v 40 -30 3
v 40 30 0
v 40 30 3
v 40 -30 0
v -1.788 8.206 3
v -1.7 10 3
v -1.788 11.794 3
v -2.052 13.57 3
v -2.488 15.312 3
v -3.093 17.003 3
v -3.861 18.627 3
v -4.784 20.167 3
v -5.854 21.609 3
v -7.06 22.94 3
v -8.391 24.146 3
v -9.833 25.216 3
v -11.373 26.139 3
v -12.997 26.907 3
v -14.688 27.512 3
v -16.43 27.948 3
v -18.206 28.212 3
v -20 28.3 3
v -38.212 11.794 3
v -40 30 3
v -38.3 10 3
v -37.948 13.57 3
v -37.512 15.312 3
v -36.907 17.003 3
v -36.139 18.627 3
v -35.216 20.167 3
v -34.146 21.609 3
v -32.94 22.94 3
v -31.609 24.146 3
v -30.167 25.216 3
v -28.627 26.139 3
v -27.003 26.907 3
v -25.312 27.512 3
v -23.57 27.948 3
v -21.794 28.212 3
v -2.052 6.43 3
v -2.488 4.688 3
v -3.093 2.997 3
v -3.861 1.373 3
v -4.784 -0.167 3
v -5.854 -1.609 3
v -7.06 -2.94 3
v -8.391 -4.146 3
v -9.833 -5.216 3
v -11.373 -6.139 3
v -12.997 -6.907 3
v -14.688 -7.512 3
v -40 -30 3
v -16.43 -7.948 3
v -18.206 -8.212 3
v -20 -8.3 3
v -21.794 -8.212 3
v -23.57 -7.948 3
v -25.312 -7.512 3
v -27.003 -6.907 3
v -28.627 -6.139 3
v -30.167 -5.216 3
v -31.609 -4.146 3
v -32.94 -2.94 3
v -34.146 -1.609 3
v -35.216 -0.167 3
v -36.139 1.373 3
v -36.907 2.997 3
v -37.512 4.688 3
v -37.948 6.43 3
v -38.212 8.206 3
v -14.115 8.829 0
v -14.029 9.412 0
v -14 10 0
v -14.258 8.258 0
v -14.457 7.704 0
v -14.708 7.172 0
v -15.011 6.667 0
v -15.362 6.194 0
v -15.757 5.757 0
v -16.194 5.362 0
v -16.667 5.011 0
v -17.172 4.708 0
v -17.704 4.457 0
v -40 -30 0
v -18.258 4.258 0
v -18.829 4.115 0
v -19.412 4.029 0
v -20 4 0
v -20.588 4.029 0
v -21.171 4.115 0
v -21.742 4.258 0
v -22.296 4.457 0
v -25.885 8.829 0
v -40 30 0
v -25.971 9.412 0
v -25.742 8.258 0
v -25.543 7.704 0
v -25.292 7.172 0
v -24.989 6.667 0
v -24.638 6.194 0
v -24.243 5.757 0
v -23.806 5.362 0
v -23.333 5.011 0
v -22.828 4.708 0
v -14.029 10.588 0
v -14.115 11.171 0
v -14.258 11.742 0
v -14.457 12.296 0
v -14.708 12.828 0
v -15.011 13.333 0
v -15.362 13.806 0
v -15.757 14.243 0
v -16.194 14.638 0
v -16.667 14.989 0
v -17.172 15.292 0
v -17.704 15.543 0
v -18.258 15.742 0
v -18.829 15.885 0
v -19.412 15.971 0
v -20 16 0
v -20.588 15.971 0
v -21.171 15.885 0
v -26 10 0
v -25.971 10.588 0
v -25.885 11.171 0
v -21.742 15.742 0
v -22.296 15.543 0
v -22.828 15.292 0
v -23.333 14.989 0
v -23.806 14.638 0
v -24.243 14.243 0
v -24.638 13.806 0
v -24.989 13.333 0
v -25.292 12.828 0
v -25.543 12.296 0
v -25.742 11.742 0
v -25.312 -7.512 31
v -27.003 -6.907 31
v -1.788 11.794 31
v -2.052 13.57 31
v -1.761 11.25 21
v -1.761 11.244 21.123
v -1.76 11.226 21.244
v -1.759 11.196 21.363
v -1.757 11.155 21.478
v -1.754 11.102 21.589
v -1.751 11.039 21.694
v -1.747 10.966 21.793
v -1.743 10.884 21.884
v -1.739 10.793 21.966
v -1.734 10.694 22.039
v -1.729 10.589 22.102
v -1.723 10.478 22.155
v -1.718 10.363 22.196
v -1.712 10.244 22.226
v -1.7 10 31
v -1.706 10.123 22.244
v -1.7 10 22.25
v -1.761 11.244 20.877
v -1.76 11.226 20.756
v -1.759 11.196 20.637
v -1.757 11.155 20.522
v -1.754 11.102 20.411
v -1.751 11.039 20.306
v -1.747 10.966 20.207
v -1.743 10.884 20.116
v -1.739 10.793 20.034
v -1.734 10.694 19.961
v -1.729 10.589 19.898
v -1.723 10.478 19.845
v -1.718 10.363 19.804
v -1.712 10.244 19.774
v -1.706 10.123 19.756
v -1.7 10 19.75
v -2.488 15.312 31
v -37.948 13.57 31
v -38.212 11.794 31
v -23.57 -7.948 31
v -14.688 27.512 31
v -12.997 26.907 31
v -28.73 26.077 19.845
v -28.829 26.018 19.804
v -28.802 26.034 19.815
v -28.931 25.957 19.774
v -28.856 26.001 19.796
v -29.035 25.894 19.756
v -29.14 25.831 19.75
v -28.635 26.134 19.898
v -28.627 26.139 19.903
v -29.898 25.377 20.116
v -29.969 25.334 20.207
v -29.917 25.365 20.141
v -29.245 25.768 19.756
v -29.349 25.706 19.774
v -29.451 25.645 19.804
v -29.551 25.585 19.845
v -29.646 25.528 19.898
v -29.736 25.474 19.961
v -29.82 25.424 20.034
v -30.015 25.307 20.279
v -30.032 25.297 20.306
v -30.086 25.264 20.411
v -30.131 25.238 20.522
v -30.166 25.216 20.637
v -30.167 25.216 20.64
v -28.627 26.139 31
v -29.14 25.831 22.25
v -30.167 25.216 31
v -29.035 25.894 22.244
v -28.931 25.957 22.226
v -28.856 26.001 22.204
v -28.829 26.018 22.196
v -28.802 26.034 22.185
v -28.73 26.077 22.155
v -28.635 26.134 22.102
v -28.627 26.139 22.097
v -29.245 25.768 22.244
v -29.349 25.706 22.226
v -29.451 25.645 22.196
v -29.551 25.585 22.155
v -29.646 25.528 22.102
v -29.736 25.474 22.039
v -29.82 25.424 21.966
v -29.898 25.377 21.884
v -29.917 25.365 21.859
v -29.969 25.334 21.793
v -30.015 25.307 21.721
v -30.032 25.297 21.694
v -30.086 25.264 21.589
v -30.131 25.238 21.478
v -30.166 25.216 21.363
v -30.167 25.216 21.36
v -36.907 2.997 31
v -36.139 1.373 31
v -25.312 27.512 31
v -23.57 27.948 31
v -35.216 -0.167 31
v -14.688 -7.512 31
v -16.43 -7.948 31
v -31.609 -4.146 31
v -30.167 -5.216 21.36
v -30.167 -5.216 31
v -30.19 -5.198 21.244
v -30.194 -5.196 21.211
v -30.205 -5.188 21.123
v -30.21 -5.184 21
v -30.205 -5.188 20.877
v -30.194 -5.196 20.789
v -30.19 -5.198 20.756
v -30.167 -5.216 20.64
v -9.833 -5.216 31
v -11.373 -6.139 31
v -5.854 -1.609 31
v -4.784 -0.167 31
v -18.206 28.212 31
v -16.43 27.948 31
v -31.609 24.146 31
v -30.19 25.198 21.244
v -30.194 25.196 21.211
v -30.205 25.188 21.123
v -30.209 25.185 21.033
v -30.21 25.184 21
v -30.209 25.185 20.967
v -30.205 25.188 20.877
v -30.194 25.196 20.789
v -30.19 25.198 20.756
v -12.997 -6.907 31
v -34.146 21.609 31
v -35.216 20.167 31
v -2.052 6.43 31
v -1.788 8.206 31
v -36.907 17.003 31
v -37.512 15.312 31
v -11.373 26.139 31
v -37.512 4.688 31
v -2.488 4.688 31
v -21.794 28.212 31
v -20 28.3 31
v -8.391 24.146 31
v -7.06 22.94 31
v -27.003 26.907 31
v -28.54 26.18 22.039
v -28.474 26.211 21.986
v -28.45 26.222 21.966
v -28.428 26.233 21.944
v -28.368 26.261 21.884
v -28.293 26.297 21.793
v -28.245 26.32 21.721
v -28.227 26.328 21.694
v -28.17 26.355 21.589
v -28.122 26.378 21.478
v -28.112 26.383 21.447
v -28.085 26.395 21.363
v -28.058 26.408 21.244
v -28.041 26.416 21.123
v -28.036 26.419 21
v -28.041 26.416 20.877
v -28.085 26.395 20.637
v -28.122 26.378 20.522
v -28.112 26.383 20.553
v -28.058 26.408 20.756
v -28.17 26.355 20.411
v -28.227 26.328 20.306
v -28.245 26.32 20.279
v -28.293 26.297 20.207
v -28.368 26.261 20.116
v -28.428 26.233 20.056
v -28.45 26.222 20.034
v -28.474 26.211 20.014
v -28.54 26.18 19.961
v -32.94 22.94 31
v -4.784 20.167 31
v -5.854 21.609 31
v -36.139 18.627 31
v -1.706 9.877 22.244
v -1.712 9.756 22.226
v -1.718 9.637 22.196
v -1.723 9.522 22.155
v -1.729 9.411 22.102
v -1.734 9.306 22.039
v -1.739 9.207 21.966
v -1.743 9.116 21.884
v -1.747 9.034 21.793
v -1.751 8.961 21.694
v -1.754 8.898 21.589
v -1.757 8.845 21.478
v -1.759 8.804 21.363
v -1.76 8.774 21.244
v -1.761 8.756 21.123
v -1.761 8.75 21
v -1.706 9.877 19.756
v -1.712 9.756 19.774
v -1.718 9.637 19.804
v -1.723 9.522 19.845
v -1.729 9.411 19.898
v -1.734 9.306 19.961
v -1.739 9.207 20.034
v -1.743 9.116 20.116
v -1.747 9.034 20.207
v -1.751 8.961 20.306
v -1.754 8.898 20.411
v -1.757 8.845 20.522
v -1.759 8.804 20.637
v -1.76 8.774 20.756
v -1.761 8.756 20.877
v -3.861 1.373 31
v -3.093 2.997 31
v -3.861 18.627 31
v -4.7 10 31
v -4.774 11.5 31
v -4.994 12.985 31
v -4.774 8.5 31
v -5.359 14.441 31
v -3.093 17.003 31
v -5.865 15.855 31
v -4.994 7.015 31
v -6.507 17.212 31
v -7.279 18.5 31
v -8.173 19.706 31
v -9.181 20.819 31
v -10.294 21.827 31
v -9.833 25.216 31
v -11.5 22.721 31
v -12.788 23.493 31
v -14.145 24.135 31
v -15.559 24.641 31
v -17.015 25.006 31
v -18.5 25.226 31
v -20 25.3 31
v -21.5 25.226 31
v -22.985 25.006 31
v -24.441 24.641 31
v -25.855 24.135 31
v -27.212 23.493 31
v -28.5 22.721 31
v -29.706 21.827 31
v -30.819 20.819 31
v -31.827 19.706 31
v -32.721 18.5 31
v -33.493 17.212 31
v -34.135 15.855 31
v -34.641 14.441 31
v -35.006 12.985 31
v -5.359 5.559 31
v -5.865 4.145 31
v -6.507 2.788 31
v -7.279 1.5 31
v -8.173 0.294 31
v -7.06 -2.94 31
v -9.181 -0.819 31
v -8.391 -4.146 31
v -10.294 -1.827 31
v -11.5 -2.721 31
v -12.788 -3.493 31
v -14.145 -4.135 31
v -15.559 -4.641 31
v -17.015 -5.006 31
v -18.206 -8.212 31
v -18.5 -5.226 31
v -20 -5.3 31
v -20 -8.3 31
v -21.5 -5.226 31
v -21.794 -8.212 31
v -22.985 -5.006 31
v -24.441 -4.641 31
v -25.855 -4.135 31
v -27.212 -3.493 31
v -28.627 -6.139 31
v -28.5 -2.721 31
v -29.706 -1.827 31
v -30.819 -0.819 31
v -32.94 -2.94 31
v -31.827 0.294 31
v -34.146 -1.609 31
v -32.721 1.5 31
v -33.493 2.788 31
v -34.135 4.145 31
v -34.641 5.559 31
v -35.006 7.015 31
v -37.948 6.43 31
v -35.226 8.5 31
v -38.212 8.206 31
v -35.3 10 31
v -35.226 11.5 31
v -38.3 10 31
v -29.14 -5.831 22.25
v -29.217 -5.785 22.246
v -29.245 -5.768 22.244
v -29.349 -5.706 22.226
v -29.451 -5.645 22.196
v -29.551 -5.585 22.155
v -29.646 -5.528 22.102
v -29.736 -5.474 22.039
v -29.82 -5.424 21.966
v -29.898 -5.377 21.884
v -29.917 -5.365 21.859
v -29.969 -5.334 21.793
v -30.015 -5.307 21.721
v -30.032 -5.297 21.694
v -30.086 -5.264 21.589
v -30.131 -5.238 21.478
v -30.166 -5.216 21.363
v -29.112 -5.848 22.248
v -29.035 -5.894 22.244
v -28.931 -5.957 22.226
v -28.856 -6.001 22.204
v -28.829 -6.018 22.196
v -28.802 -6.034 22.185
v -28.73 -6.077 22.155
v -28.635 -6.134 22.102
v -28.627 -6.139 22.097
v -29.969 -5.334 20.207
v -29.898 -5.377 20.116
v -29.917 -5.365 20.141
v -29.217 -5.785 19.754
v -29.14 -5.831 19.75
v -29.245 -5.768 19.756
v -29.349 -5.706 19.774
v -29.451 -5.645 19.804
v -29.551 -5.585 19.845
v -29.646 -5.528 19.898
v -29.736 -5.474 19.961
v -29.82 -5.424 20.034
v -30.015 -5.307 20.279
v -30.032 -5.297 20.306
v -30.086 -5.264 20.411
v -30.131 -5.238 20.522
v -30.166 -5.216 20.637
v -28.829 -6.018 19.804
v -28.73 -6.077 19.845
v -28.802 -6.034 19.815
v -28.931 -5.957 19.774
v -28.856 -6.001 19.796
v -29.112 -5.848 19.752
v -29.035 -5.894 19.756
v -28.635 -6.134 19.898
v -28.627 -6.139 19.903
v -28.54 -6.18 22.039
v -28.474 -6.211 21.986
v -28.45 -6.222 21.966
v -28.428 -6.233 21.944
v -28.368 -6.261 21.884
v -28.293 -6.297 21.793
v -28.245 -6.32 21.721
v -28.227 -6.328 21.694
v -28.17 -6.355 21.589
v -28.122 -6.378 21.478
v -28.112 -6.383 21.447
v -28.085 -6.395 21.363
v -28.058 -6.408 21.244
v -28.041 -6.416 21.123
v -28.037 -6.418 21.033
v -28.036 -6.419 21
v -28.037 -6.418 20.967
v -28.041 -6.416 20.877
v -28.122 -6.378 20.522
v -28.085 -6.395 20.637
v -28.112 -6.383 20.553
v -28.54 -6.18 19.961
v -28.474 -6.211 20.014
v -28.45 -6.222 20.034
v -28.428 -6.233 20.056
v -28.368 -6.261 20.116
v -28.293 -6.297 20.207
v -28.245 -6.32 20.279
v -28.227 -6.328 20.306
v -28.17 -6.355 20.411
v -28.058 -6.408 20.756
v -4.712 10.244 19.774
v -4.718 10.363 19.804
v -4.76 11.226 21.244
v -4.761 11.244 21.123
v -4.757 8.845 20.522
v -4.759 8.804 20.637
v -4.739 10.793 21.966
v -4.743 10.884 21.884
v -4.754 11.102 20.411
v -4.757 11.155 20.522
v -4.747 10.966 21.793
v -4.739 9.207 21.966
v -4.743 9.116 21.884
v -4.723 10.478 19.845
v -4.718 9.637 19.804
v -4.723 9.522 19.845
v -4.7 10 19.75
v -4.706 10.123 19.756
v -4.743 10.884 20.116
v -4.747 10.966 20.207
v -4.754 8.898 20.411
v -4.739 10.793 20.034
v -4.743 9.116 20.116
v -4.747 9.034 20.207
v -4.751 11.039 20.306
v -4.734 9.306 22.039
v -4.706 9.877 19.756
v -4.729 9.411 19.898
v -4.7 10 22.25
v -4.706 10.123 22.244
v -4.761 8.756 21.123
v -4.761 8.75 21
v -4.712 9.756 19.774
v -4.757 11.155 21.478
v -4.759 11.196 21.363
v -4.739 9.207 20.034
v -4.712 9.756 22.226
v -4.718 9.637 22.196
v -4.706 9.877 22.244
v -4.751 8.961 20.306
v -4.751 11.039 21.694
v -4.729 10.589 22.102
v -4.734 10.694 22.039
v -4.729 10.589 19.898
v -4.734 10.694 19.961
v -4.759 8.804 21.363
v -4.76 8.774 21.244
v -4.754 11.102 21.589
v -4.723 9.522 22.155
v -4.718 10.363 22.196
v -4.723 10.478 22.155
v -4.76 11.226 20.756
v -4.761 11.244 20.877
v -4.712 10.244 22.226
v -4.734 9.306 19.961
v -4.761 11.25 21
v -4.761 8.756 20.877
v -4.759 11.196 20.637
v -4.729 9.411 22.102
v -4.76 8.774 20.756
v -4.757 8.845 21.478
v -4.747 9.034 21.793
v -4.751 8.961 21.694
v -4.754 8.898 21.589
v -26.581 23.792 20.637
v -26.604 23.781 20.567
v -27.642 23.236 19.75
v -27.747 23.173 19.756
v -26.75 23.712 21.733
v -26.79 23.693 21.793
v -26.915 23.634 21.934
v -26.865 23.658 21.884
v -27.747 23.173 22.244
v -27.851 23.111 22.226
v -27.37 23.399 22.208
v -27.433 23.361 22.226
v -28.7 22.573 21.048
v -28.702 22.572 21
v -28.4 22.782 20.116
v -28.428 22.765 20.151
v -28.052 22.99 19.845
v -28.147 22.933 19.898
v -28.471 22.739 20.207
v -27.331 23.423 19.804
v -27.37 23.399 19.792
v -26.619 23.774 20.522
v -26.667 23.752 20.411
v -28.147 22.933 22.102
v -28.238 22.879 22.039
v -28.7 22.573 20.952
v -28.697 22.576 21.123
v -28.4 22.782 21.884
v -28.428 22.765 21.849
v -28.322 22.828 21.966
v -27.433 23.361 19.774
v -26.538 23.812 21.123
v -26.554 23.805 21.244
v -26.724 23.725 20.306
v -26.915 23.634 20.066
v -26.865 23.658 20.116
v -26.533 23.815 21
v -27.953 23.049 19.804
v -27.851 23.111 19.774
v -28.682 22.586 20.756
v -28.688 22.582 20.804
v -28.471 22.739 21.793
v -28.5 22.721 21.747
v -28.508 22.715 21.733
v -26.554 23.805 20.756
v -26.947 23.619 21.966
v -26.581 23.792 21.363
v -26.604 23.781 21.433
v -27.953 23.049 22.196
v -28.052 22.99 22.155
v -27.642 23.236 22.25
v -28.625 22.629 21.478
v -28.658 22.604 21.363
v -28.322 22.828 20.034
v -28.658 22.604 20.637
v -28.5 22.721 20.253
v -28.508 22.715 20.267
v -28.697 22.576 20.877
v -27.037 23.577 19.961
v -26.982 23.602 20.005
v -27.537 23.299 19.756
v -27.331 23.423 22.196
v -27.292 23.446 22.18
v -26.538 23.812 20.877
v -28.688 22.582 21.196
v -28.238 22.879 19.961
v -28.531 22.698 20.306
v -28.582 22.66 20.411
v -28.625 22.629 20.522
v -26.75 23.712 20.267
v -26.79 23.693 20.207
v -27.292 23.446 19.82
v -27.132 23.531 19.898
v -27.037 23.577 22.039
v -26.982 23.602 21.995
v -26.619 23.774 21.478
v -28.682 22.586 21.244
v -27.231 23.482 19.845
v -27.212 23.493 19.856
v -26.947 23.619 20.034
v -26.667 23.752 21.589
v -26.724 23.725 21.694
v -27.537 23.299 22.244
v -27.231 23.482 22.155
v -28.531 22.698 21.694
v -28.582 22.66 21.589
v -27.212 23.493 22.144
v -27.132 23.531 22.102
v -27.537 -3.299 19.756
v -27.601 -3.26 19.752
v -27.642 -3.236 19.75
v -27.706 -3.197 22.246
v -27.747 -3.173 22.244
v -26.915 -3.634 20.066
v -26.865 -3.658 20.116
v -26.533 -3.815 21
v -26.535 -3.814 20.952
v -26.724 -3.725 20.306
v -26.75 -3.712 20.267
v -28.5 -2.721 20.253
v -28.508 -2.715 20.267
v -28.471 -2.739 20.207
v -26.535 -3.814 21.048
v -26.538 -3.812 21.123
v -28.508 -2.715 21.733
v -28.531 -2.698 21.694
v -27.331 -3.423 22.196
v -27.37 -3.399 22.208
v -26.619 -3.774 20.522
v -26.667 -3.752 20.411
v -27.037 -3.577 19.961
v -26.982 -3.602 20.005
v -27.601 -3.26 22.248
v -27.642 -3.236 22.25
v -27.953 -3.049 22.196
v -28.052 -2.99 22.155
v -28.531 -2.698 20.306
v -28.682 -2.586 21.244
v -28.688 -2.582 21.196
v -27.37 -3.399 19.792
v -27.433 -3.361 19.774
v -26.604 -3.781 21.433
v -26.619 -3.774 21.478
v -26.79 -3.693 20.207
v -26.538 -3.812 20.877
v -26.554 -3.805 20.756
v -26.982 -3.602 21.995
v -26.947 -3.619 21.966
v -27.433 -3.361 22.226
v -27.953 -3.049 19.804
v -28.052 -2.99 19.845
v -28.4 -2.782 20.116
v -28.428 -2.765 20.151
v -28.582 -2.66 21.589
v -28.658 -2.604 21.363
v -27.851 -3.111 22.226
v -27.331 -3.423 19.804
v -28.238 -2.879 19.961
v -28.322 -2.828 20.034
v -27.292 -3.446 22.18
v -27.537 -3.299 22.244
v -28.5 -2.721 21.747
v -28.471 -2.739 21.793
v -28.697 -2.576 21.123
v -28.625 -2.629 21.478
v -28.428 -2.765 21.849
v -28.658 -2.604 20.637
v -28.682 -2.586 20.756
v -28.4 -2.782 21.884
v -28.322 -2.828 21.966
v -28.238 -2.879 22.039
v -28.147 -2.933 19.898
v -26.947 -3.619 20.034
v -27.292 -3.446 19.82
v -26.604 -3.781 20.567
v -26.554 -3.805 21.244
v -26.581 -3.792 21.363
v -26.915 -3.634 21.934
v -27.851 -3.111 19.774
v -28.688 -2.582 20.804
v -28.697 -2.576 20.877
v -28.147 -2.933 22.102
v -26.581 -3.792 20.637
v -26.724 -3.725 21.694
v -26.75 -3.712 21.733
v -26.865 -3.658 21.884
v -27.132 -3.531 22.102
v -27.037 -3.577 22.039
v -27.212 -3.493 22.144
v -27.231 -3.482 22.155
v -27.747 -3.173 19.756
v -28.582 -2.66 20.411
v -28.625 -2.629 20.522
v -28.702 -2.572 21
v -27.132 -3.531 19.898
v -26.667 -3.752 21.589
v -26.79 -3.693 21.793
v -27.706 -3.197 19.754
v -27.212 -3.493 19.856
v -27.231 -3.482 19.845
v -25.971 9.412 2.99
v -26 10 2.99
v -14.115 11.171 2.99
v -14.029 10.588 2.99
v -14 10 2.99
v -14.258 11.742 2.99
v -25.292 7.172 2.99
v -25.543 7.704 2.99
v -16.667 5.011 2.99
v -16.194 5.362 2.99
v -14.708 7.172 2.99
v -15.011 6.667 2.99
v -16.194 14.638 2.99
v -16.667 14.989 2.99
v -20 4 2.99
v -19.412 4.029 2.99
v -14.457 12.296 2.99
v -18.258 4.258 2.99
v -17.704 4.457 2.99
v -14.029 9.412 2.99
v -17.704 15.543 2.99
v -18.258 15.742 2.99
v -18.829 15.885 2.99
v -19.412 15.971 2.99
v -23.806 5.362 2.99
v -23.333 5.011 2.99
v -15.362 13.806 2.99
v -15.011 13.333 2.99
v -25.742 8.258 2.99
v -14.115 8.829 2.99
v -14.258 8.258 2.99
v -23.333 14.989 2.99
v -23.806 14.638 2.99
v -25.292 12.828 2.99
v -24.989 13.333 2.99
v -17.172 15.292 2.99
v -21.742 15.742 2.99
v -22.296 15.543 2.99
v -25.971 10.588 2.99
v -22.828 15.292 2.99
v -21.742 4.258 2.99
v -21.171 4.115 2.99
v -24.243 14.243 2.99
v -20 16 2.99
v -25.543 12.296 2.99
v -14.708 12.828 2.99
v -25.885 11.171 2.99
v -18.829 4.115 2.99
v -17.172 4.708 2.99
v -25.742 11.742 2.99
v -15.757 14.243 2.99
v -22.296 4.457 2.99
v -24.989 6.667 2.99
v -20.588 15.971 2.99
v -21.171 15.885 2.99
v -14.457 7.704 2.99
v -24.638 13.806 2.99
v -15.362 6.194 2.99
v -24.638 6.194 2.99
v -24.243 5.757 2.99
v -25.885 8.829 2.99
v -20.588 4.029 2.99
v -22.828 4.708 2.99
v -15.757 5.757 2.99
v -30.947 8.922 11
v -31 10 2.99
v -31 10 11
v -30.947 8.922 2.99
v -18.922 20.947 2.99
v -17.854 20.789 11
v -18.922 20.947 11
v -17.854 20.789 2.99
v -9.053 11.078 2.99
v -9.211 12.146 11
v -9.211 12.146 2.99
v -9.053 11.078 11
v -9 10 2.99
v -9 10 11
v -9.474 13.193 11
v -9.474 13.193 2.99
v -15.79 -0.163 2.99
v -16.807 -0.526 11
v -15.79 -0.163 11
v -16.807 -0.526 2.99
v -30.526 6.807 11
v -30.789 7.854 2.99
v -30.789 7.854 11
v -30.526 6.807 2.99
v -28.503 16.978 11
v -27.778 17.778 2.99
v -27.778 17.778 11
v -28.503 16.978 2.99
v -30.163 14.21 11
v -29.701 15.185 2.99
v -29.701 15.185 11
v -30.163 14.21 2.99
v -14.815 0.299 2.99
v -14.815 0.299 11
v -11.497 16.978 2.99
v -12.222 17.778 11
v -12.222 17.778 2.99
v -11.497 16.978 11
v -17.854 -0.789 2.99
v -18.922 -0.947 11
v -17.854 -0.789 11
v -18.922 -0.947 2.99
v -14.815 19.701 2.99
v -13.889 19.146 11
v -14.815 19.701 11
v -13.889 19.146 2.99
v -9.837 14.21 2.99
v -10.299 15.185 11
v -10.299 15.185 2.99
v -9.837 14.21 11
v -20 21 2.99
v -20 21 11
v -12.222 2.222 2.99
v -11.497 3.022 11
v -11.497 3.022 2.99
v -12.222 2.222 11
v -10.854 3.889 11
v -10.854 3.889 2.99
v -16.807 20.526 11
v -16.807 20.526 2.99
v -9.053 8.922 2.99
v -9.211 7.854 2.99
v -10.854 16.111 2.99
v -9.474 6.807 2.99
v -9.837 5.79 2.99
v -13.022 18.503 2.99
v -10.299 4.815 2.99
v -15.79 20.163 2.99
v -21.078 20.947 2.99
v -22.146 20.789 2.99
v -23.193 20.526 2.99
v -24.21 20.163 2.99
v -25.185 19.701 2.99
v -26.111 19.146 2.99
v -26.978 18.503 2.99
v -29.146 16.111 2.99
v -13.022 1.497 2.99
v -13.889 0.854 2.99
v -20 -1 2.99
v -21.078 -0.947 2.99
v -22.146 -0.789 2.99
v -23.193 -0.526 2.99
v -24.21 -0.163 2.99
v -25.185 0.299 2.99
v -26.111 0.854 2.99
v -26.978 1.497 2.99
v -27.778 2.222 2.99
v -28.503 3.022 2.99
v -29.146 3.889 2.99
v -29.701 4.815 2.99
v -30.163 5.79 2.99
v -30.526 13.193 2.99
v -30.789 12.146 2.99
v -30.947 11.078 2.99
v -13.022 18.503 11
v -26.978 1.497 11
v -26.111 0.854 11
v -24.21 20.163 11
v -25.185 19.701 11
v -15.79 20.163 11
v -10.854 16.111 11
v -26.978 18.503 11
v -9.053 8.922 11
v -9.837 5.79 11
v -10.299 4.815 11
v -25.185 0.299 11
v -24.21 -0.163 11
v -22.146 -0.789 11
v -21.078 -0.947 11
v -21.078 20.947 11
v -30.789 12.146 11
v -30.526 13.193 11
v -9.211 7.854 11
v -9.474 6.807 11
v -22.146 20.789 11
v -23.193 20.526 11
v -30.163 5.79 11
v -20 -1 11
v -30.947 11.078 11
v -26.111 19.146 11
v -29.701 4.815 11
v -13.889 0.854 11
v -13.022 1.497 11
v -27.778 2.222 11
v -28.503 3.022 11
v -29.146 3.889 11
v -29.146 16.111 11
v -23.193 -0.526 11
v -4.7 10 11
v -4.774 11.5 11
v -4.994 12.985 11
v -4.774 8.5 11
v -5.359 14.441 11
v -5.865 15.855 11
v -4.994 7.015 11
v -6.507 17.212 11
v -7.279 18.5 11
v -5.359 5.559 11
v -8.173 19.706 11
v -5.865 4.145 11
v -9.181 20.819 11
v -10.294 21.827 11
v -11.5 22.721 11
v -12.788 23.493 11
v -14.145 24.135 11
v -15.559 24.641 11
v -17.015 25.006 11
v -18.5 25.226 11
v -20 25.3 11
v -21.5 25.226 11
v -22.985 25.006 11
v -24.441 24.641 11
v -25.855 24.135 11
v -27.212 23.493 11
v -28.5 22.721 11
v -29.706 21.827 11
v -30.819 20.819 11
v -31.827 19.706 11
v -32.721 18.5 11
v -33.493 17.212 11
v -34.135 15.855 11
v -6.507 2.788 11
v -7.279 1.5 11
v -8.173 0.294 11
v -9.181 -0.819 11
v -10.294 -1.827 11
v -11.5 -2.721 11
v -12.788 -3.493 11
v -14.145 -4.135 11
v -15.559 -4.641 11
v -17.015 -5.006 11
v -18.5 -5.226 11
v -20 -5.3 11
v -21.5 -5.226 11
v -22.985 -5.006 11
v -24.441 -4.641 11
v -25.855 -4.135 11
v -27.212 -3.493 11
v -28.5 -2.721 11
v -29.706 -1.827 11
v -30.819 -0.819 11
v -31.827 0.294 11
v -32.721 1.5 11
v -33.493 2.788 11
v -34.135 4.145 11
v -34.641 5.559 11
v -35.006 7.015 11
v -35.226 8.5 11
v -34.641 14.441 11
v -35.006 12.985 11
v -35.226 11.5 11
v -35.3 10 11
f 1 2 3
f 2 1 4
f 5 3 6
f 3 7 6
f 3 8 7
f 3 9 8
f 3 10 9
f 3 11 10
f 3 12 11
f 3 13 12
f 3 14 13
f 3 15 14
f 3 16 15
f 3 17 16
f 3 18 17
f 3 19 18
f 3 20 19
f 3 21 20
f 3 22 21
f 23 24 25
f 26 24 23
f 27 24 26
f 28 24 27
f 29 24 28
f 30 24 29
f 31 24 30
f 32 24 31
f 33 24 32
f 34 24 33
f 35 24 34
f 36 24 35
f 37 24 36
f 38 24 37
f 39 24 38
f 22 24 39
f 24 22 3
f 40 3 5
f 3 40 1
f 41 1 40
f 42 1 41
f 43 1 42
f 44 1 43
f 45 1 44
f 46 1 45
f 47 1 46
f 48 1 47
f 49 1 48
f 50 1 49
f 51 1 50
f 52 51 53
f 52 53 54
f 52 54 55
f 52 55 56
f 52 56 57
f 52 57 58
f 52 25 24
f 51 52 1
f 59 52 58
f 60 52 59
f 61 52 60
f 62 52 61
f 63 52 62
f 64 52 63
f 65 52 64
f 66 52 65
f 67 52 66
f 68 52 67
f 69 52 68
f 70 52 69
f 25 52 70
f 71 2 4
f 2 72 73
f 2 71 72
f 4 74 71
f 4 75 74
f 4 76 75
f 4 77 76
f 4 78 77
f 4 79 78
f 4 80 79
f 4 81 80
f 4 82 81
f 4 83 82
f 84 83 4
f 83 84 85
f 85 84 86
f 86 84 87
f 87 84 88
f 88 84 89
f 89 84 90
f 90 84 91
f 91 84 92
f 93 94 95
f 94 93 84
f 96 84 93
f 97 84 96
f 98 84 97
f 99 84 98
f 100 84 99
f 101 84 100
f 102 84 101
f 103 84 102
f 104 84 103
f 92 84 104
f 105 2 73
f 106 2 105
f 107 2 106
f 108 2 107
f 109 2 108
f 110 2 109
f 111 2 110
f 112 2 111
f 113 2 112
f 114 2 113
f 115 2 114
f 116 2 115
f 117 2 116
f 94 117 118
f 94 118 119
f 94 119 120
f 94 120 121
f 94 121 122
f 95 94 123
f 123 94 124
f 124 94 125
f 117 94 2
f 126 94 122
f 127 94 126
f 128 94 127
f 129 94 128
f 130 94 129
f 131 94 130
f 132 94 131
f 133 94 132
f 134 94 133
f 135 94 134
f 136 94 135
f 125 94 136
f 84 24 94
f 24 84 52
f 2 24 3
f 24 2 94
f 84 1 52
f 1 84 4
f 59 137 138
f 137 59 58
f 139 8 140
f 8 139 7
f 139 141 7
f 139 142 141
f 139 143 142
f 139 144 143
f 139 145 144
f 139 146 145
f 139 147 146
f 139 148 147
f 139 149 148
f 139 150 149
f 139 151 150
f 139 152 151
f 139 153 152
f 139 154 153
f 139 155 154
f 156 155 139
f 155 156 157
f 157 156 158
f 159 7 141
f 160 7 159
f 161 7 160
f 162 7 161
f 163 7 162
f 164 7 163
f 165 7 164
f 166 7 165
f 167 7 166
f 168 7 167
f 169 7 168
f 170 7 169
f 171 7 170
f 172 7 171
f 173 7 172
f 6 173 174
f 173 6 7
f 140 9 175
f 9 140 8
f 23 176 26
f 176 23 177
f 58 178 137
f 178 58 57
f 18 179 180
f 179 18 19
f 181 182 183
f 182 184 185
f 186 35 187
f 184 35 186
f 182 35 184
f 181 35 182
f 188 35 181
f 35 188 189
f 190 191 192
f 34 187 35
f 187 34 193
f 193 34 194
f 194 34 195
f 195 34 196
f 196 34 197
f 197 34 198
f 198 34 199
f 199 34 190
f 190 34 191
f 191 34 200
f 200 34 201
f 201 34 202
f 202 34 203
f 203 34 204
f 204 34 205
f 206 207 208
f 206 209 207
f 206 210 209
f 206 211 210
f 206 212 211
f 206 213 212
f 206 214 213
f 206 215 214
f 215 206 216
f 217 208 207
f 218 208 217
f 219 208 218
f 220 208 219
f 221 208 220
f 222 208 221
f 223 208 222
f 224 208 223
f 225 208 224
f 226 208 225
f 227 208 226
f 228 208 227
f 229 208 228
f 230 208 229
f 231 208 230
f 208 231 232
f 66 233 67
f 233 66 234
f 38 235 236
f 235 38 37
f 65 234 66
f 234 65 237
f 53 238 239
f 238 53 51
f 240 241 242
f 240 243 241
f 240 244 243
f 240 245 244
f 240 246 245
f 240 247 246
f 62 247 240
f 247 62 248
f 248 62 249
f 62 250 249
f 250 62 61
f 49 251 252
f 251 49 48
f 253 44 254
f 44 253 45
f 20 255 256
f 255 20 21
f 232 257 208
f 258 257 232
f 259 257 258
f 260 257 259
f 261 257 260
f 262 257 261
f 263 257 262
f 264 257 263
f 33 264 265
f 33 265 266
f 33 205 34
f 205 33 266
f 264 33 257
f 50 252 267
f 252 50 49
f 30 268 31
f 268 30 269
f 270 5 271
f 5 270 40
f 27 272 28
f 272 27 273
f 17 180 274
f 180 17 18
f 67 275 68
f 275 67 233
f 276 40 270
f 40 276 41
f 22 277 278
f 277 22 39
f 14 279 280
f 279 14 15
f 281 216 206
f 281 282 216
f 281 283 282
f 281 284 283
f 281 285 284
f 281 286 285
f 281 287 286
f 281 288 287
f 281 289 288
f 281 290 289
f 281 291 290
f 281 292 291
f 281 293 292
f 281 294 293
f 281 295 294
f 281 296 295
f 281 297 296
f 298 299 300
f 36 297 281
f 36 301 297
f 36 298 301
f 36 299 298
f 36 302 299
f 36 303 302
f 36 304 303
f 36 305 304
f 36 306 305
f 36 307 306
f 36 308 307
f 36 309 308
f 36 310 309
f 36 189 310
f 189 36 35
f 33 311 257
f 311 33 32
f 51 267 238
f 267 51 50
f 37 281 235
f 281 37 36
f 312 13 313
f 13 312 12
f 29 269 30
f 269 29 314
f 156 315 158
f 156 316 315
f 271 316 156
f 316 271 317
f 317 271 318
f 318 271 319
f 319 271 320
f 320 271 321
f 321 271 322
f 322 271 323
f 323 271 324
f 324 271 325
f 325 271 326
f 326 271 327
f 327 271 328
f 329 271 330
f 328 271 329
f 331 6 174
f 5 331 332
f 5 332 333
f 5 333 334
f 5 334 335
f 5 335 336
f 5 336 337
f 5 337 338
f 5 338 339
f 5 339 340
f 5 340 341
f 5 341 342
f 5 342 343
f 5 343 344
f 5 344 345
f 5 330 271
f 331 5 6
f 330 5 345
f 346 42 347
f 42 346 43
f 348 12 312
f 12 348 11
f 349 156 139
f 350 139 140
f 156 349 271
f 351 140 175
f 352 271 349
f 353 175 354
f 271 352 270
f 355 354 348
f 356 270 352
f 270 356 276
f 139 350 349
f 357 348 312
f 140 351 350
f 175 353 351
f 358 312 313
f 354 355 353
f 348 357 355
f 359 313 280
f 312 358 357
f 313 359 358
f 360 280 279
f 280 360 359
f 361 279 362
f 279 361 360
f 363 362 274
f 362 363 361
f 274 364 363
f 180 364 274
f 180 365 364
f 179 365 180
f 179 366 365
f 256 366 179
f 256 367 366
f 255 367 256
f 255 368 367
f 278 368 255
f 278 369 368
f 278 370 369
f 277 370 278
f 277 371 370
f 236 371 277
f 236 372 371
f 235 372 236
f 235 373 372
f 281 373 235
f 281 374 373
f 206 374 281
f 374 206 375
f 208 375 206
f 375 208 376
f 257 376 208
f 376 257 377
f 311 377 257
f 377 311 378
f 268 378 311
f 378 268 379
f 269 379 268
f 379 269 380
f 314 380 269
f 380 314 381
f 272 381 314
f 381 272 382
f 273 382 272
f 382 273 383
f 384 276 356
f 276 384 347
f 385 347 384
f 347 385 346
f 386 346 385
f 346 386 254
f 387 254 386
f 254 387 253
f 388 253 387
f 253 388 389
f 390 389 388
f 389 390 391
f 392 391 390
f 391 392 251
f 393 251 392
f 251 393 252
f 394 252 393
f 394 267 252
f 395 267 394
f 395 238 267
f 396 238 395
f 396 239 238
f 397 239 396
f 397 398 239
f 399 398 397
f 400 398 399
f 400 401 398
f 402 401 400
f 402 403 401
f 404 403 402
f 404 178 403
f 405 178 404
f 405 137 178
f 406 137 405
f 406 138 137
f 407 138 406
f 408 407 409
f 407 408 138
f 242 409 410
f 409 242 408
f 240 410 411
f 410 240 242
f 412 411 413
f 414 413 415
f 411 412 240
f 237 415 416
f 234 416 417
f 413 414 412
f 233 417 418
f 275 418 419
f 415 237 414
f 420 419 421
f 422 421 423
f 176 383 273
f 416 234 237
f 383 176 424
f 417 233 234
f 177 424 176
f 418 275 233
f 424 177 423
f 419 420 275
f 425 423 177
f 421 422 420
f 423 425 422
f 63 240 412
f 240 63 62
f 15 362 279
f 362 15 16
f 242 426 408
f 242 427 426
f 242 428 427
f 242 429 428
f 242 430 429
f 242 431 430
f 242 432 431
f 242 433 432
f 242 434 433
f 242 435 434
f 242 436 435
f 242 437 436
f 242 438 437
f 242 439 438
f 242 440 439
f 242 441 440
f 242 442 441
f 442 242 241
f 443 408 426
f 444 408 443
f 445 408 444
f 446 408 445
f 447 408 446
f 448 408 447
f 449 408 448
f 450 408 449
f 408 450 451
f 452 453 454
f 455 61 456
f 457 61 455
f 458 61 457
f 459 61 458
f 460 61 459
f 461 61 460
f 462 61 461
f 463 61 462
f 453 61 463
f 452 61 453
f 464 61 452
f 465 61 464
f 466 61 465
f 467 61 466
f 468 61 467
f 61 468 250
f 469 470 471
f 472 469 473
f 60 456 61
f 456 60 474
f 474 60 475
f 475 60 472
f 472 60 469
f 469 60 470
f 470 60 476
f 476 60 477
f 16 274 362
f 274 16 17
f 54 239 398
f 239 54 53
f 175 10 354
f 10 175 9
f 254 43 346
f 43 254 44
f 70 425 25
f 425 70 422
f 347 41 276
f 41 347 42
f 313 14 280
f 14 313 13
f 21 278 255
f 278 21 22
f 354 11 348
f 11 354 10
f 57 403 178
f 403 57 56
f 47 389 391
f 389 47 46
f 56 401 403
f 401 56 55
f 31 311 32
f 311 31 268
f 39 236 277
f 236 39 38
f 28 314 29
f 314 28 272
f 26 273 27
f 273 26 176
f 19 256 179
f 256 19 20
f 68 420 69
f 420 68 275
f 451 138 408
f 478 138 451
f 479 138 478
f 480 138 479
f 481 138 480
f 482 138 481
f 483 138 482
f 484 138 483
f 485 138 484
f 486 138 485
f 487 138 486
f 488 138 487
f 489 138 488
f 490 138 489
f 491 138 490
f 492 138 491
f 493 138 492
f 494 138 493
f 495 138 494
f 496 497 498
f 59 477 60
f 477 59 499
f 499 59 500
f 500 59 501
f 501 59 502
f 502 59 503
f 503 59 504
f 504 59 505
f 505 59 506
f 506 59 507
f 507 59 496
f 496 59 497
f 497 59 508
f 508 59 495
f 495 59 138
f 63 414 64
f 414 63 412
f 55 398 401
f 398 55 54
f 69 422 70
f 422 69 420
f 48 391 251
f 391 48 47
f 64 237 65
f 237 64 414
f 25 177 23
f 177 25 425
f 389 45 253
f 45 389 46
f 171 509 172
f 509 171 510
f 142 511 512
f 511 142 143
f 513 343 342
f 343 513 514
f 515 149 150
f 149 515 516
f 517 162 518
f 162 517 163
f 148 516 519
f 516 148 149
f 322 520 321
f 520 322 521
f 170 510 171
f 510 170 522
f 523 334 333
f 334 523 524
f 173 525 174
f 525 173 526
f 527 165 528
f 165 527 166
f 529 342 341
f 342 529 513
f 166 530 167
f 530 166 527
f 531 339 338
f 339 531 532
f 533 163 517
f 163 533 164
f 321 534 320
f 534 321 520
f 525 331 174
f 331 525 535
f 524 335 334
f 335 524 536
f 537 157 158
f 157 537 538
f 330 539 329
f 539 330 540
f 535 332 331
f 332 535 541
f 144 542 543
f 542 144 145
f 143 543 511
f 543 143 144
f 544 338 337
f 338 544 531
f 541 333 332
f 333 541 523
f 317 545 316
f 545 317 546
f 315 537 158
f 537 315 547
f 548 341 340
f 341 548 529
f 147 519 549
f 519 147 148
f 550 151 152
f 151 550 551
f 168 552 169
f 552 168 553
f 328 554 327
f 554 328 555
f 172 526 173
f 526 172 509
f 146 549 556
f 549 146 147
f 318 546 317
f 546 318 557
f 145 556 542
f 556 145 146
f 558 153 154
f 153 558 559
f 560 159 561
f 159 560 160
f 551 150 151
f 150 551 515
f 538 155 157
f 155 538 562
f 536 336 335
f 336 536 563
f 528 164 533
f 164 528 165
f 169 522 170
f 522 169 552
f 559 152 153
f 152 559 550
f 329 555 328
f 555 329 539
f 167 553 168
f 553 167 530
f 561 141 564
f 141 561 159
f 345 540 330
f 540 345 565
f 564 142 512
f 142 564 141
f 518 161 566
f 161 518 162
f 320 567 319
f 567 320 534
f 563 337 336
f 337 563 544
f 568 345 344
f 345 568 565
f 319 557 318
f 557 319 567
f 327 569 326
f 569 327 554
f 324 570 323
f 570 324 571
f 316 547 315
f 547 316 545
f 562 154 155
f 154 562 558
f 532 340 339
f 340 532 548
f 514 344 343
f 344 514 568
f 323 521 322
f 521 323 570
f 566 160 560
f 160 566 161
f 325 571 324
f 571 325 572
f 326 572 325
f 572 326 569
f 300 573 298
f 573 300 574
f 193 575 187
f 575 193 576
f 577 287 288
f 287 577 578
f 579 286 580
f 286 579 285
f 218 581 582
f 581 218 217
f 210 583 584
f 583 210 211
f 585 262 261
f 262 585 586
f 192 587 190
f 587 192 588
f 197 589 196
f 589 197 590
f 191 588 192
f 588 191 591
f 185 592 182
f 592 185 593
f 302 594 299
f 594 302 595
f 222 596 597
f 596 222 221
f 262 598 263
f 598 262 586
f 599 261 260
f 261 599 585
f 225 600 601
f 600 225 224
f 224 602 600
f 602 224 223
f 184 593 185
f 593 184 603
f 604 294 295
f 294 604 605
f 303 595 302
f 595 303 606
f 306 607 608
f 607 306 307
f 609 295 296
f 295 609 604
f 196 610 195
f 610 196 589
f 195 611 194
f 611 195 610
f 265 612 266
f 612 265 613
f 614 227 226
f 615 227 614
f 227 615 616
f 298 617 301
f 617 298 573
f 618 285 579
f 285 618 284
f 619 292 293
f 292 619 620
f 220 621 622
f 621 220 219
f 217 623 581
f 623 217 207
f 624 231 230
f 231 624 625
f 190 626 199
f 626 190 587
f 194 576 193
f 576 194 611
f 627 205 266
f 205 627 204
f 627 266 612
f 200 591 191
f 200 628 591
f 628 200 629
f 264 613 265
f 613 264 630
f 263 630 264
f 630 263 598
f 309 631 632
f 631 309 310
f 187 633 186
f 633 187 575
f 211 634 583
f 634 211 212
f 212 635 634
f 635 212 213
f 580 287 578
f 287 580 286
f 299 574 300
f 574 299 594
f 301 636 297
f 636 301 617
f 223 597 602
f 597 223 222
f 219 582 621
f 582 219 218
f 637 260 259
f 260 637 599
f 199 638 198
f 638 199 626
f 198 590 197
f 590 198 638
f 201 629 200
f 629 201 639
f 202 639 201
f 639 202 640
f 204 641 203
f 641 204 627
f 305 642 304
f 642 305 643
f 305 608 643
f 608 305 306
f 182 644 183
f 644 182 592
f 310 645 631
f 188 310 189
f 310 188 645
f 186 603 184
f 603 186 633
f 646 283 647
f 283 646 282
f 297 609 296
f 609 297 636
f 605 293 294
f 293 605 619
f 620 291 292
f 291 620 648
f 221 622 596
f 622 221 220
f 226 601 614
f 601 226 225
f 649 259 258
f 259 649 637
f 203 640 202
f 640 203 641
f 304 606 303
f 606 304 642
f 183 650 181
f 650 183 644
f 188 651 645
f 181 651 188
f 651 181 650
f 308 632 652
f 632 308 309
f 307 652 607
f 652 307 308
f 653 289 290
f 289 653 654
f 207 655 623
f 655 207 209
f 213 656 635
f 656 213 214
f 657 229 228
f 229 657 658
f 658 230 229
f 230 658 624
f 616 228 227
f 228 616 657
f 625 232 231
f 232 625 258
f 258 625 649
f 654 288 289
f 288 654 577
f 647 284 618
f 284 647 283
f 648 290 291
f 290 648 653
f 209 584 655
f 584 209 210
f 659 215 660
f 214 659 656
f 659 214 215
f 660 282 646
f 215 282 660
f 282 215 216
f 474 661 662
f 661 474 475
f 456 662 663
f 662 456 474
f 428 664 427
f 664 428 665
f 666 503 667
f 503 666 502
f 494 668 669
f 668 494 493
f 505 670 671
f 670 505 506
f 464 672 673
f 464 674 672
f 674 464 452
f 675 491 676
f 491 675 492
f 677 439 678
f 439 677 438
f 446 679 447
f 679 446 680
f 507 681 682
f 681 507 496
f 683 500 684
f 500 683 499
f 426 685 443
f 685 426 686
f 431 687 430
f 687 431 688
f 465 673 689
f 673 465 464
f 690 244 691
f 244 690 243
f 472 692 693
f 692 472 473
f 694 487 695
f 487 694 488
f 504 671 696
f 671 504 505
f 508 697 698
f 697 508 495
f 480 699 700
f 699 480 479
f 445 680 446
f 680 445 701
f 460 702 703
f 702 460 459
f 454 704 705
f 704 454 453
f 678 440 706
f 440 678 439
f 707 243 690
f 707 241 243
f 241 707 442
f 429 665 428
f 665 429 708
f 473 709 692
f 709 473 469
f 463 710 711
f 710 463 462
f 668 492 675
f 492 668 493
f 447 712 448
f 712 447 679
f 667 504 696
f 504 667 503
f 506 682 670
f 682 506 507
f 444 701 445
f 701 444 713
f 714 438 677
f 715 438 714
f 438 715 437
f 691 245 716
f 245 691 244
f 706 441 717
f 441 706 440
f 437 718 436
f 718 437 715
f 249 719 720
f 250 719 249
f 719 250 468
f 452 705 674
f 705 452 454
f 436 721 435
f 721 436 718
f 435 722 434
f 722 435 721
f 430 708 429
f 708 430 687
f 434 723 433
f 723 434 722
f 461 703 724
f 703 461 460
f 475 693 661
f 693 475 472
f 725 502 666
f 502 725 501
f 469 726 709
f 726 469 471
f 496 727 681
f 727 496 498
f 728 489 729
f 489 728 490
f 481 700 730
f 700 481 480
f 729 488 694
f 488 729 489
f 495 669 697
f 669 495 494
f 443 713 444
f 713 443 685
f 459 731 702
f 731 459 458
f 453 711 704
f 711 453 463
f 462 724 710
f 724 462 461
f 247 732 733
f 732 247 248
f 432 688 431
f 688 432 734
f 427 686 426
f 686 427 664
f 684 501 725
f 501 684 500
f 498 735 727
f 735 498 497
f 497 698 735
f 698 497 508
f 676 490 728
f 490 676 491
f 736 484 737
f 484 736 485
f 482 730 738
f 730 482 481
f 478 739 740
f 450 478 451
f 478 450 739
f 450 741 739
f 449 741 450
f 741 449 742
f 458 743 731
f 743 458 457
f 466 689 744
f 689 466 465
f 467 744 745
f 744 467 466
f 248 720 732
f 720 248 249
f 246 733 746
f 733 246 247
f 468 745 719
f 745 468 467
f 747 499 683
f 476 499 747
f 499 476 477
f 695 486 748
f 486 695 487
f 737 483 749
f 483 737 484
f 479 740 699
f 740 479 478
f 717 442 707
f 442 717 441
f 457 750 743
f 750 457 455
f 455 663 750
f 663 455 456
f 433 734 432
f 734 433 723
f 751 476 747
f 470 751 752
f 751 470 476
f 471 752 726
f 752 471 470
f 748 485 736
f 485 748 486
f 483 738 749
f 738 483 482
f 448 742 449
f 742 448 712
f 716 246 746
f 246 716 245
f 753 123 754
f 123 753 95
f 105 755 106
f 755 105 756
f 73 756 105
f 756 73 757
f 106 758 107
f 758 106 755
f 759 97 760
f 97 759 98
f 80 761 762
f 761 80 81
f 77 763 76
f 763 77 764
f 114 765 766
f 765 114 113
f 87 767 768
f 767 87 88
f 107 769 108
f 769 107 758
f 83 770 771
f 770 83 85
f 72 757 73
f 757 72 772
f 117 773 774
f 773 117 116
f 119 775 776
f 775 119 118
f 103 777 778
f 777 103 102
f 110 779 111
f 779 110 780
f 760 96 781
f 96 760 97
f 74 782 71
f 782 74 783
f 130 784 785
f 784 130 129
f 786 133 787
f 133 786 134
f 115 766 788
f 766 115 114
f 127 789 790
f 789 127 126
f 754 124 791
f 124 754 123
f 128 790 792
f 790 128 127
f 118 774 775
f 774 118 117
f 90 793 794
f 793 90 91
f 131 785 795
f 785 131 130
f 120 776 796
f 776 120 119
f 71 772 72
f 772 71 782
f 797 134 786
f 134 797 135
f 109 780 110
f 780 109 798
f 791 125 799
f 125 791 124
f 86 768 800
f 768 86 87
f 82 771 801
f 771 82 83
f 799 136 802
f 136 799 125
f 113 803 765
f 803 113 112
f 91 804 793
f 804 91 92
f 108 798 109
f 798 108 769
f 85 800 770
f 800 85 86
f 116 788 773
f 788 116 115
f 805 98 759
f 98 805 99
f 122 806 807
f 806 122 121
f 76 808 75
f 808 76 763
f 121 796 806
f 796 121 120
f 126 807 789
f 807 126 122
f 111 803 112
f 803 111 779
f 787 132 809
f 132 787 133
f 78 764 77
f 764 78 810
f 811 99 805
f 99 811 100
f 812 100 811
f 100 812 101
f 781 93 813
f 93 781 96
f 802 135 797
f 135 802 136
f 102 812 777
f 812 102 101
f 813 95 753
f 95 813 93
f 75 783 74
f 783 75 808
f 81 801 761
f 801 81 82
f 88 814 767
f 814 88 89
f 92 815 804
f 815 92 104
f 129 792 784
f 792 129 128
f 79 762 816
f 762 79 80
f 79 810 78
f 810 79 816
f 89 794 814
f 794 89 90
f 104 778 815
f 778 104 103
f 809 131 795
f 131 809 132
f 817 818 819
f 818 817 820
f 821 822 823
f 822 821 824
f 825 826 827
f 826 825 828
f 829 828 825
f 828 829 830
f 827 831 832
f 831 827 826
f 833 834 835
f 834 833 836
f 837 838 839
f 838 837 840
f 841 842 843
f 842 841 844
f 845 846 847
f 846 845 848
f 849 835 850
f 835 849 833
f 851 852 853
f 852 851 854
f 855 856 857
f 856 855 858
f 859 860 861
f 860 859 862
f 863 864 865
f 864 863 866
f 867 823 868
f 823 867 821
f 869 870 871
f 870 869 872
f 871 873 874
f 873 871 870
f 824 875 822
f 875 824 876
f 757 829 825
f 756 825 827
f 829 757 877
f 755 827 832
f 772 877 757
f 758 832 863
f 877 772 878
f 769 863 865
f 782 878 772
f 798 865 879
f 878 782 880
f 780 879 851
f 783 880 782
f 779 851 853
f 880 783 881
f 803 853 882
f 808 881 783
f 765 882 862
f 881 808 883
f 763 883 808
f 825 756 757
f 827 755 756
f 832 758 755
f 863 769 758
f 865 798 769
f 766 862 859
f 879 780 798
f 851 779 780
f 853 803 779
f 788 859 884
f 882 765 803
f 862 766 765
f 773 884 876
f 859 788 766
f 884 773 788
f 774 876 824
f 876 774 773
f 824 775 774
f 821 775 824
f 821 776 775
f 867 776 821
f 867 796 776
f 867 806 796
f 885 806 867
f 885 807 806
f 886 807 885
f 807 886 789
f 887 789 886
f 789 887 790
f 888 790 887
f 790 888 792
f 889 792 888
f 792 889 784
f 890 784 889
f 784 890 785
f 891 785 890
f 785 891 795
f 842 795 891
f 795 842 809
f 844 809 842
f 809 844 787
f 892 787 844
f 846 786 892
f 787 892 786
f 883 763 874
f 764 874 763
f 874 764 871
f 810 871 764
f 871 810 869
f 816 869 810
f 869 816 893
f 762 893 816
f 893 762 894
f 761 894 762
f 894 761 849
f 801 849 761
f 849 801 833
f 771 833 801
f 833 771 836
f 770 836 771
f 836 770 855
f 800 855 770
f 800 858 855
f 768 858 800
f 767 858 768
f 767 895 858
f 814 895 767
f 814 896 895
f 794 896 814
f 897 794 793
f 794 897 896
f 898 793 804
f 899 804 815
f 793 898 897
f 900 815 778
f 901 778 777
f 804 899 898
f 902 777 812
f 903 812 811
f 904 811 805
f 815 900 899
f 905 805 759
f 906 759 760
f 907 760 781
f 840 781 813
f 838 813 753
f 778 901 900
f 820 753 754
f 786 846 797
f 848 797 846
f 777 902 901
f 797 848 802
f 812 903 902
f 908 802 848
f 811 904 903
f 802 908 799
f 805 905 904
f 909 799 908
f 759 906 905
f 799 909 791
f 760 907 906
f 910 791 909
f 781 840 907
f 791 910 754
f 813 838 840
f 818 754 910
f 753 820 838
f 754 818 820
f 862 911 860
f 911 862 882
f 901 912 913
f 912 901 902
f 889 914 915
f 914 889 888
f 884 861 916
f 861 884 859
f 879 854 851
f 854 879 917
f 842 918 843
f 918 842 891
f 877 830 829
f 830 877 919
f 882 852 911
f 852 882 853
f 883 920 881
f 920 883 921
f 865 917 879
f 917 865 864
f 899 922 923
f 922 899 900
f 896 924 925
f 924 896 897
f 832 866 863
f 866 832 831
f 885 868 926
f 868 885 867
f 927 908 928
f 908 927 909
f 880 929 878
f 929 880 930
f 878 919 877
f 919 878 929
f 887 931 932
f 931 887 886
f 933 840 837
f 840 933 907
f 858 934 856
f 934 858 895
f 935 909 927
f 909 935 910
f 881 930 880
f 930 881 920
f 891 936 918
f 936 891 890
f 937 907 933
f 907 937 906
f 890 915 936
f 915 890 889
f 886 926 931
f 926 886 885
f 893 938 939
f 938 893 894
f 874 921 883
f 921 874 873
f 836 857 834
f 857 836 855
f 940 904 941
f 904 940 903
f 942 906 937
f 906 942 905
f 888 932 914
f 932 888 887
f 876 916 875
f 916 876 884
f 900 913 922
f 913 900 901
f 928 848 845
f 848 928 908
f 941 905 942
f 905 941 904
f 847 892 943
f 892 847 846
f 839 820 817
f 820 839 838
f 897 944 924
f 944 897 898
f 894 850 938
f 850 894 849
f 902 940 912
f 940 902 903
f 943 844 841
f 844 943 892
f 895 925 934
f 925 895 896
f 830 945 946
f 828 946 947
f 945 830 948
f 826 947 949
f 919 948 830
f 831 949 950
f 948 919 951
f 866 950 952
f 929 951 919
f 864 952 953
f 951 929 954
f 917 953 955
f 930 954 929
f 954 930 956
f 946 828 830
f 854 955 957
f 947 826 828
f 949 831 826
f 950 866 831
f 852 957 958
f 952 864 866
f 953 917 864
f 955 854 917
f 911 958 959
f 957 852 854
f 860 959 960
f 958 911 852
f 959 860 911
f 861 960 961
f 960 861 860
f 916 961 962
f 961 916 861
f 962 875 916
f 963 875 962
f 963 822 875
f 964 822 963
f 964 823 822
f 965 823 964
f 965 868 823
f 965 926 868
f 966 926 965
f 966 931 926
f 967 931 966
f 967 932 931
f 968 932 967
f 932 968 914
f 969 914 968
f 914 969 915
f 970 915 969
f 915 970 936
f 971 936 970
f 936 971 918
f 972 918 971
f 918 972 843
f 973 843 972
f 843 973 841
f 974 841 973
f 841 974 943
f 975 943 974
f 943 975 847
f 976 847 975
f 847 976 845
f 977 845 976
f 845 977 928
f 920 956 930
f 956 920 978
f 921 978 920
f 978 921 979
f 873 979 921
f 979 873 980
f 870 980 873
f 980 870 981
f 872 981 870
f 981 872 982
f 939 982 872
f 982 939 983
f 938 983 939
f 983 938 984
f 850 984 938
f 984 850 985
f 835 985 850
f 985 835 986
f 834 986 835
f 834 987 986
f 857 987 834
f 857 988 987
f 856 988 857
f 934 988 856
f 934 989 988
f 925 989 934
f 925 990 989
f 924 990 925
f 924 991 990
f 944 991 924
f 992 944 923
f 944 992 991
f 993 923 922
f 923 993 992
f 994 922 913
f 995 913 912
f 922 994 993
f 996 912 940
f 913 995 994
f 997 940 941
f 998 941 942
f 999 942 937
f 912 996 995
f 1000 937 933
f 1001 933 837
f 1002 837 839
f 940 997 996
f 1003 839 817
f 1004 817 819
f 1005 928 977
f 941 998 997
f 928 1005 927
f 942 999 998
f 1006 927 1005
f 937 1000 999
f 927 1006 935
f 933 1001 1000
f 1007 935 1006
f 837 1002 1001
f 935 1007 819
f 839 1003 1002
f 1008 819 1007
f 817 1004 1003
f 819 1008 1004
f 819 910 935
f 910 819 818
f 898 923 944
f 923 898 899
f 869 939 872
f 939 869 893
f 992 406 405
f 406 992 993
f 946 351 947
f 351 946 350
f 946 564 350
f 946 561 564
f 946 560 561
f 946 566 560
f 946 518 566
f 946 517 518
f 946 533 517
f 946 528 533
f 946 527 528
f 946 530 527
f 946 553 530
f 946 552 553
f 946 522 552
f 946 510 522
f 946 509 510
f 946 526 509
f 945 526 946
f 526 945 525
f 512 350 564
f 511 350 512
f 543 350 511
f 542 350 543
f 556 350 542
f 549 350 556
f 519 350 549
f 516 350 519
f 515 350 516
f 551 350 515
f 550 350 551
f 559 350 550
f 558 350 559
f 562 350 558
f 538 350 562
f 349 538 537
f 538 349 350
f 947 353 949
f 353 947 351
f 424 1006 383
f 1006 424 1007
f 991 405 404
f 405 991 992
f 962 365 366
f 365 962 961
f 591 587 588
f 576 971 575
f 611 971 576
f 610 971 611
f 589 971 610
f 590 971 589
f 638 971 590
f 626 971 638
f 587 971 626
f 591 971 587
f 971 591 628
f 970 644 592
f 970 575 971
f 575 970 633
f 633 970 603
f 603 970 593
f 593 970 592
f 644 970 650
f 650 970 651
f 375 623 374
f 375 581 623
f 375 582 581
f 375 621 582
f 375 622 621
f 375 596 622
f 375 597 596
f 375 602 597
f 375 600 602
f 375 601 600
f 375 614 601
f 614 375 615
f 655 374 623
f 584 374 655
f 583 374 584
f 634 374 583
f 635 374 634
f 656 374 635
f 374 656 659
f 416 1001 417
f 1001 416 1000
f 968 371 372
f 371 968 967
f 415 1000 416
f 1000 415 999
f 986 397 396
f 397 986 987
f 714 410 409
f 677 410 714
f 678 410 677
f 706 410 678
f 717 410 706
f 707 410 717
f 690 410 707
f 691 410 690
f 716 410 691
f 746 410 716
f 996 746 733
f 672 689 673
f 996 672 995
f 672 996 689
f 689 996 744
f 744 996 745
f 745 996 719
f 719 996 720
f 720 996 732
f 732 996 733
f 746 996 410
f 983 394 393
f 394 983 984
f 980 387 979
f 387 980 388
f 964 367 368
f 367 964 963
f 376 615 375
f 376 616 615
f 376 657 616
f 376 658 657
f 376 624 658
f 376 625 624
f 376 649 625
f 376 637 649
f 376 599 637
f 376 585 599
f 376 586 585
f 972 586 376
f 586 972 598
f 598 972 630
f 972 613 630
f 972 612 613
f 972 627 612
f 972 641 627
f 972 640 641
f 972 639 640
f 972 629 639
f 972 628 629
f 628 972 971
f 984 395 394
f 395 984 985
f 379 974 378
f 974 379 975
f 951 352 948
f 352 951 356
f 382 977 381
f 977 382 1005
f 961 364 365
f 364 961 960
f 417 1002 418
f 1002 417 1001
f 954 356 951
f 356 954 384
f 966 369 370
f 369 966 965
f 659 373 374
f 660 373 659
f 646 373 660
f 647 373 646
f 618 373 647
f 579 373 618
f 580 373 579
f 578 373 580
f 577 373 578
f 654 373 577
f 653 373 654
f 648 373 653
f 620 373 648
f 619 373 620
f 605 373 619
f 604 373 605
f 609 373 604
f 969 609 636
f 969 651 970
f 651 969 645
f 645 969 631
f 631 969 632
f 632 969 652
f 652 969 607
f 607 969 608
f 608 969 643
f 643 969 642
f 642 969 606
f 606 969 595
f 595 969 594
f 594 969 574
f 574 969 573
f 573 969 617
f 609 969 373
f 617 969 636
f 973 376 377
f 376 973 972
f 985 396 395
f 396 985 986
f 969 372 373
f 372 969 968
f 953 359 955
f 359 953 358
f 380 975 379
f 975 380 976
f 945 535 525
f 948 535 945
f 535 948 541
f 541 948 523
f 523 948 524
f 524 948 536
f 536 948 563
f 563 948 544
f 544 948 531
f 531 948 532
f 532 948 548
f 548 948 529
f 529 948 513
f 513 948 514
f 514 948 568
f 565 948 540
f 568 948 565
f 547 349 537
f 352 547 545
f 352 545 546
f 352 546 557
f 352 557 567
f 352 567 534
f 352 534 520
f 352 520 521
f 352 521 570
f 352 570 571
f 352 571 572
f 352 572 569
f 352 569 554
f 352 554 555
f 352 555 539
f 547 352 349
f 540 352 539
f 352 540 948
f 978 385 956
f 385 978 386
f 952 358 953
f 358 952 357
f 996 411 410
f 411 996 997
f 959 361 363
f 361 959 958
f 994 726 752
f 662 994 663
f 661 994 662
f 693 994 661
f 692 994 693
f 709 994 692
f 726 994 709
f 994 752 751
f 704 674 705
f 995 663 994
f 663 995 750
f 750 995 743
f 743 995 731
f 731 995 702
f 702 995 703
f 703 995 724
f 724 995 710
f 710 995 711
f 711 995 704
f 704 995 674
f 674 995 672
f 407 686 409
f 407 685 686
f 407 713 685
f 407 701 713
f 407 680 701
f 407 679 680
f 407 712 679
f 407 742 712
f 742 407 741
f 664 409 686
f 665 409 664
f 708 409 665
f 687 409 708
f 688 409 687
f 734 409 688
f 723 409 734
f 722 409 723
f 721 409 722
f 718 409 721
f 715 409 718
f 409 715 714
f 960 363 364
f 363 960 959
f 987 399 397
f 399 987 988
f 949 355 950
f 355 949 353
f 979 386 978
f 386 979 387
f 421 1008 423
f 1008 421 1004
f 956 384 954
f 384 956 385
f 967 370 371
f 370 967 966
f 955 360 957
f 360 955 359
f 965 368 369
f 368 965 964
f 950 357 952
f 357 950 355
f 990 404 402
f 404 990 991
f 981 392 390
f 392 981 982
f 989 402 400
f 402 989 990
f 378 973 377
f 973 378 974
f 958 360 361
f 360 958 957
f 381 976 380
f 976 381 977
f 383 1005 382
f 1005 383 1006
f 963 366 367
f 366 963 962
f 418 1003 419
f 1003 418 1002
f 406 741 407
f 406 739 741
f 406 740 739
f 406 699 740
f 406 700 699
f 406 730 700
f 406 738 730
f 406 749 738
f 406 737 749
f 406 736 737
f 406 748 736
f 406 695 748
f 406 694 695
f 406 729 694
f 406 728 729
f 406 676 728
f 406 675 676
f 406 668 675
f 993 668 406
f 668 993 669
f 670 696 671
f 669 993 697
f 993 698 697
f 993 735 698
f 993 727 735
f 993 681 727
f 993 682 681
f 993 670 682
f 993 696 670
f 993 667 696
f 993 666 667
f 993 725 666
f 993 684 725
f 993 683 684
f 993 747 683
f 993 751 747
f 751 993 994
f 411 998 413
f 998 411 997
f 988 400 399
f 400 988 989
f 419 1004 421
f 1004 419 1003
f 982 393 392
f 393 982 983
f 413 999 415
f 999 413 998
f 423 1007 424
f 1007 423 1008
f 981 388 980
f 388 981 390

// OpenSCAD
// Microscope eyepiece phone-camera adapter (printed phone side down)

$fn = 64;

// Plate
plate_x = 80;          // plate size X
plate_y = 60;          // plate size Y
plate_t = 3;           // plate thickness

// Camera hole / sleeve axis position
axis_x = -20;          // X of camera-hole axis
axis_y = 10;           // Y of camera-hole axis
cam_d = 12;            // camera hole diameter

// Sleeve
sleeve_od = 36.6;      // sleeve outer diameter
sleeve_top = 31;       // sleeve top z
stop_d = 22;           // lower bore diameter (eyepiece stop)
stop_top = 11;         // z where lower bore ends
bore_d = 30.6;         // upper bore diameter (eyepiece fit)

// Centring screw holes
screw_d = 2.5;         // radial hole diameter
screw_z = 21;          // hole height
screw_n = 3;           // number of holes
screw_start = 0;       // first hole angle (+X)
screw_len = 25;        // cutter length measured from axis

eps = 0.01;

difference() {
    union() {
        // base plate
        translate([-plate_x/2, -plate_y/2, 0])
            cube([plate_x, plate_y, plate_t]);
        // sleeve
        translate([axis_x, axis_y, plate_t])
            cylinder(d = sleeve_od, h = sleeve_top - plate_t);
    }

    // camera hole through plate
    translate([axis_x, axis_y, -1])
        cylinder(d = cam_d, h = plate_t + 2);

    // lower bore (stop)
    translate([axis_x, axis_y, plate_t - eps])
        cylinder(d = stop_d, h = stop_top - plate_t + eps);

    // upper bore
    translate([axis_x, axis_y, stop_top])
        cylinder(d = bore_d, h = sleeve_top - stop_top + 1);

    // radial screw holes
    for (i = [0 : screw_n - 1])
        translate([axis_x, axis_y, screw_z])
            rotate([0, 0, screw_start + i * 360 / screw_n])
                rotate([0, 90, 0])
                    cylinder(d = screw_d, h = screw_len);
}
